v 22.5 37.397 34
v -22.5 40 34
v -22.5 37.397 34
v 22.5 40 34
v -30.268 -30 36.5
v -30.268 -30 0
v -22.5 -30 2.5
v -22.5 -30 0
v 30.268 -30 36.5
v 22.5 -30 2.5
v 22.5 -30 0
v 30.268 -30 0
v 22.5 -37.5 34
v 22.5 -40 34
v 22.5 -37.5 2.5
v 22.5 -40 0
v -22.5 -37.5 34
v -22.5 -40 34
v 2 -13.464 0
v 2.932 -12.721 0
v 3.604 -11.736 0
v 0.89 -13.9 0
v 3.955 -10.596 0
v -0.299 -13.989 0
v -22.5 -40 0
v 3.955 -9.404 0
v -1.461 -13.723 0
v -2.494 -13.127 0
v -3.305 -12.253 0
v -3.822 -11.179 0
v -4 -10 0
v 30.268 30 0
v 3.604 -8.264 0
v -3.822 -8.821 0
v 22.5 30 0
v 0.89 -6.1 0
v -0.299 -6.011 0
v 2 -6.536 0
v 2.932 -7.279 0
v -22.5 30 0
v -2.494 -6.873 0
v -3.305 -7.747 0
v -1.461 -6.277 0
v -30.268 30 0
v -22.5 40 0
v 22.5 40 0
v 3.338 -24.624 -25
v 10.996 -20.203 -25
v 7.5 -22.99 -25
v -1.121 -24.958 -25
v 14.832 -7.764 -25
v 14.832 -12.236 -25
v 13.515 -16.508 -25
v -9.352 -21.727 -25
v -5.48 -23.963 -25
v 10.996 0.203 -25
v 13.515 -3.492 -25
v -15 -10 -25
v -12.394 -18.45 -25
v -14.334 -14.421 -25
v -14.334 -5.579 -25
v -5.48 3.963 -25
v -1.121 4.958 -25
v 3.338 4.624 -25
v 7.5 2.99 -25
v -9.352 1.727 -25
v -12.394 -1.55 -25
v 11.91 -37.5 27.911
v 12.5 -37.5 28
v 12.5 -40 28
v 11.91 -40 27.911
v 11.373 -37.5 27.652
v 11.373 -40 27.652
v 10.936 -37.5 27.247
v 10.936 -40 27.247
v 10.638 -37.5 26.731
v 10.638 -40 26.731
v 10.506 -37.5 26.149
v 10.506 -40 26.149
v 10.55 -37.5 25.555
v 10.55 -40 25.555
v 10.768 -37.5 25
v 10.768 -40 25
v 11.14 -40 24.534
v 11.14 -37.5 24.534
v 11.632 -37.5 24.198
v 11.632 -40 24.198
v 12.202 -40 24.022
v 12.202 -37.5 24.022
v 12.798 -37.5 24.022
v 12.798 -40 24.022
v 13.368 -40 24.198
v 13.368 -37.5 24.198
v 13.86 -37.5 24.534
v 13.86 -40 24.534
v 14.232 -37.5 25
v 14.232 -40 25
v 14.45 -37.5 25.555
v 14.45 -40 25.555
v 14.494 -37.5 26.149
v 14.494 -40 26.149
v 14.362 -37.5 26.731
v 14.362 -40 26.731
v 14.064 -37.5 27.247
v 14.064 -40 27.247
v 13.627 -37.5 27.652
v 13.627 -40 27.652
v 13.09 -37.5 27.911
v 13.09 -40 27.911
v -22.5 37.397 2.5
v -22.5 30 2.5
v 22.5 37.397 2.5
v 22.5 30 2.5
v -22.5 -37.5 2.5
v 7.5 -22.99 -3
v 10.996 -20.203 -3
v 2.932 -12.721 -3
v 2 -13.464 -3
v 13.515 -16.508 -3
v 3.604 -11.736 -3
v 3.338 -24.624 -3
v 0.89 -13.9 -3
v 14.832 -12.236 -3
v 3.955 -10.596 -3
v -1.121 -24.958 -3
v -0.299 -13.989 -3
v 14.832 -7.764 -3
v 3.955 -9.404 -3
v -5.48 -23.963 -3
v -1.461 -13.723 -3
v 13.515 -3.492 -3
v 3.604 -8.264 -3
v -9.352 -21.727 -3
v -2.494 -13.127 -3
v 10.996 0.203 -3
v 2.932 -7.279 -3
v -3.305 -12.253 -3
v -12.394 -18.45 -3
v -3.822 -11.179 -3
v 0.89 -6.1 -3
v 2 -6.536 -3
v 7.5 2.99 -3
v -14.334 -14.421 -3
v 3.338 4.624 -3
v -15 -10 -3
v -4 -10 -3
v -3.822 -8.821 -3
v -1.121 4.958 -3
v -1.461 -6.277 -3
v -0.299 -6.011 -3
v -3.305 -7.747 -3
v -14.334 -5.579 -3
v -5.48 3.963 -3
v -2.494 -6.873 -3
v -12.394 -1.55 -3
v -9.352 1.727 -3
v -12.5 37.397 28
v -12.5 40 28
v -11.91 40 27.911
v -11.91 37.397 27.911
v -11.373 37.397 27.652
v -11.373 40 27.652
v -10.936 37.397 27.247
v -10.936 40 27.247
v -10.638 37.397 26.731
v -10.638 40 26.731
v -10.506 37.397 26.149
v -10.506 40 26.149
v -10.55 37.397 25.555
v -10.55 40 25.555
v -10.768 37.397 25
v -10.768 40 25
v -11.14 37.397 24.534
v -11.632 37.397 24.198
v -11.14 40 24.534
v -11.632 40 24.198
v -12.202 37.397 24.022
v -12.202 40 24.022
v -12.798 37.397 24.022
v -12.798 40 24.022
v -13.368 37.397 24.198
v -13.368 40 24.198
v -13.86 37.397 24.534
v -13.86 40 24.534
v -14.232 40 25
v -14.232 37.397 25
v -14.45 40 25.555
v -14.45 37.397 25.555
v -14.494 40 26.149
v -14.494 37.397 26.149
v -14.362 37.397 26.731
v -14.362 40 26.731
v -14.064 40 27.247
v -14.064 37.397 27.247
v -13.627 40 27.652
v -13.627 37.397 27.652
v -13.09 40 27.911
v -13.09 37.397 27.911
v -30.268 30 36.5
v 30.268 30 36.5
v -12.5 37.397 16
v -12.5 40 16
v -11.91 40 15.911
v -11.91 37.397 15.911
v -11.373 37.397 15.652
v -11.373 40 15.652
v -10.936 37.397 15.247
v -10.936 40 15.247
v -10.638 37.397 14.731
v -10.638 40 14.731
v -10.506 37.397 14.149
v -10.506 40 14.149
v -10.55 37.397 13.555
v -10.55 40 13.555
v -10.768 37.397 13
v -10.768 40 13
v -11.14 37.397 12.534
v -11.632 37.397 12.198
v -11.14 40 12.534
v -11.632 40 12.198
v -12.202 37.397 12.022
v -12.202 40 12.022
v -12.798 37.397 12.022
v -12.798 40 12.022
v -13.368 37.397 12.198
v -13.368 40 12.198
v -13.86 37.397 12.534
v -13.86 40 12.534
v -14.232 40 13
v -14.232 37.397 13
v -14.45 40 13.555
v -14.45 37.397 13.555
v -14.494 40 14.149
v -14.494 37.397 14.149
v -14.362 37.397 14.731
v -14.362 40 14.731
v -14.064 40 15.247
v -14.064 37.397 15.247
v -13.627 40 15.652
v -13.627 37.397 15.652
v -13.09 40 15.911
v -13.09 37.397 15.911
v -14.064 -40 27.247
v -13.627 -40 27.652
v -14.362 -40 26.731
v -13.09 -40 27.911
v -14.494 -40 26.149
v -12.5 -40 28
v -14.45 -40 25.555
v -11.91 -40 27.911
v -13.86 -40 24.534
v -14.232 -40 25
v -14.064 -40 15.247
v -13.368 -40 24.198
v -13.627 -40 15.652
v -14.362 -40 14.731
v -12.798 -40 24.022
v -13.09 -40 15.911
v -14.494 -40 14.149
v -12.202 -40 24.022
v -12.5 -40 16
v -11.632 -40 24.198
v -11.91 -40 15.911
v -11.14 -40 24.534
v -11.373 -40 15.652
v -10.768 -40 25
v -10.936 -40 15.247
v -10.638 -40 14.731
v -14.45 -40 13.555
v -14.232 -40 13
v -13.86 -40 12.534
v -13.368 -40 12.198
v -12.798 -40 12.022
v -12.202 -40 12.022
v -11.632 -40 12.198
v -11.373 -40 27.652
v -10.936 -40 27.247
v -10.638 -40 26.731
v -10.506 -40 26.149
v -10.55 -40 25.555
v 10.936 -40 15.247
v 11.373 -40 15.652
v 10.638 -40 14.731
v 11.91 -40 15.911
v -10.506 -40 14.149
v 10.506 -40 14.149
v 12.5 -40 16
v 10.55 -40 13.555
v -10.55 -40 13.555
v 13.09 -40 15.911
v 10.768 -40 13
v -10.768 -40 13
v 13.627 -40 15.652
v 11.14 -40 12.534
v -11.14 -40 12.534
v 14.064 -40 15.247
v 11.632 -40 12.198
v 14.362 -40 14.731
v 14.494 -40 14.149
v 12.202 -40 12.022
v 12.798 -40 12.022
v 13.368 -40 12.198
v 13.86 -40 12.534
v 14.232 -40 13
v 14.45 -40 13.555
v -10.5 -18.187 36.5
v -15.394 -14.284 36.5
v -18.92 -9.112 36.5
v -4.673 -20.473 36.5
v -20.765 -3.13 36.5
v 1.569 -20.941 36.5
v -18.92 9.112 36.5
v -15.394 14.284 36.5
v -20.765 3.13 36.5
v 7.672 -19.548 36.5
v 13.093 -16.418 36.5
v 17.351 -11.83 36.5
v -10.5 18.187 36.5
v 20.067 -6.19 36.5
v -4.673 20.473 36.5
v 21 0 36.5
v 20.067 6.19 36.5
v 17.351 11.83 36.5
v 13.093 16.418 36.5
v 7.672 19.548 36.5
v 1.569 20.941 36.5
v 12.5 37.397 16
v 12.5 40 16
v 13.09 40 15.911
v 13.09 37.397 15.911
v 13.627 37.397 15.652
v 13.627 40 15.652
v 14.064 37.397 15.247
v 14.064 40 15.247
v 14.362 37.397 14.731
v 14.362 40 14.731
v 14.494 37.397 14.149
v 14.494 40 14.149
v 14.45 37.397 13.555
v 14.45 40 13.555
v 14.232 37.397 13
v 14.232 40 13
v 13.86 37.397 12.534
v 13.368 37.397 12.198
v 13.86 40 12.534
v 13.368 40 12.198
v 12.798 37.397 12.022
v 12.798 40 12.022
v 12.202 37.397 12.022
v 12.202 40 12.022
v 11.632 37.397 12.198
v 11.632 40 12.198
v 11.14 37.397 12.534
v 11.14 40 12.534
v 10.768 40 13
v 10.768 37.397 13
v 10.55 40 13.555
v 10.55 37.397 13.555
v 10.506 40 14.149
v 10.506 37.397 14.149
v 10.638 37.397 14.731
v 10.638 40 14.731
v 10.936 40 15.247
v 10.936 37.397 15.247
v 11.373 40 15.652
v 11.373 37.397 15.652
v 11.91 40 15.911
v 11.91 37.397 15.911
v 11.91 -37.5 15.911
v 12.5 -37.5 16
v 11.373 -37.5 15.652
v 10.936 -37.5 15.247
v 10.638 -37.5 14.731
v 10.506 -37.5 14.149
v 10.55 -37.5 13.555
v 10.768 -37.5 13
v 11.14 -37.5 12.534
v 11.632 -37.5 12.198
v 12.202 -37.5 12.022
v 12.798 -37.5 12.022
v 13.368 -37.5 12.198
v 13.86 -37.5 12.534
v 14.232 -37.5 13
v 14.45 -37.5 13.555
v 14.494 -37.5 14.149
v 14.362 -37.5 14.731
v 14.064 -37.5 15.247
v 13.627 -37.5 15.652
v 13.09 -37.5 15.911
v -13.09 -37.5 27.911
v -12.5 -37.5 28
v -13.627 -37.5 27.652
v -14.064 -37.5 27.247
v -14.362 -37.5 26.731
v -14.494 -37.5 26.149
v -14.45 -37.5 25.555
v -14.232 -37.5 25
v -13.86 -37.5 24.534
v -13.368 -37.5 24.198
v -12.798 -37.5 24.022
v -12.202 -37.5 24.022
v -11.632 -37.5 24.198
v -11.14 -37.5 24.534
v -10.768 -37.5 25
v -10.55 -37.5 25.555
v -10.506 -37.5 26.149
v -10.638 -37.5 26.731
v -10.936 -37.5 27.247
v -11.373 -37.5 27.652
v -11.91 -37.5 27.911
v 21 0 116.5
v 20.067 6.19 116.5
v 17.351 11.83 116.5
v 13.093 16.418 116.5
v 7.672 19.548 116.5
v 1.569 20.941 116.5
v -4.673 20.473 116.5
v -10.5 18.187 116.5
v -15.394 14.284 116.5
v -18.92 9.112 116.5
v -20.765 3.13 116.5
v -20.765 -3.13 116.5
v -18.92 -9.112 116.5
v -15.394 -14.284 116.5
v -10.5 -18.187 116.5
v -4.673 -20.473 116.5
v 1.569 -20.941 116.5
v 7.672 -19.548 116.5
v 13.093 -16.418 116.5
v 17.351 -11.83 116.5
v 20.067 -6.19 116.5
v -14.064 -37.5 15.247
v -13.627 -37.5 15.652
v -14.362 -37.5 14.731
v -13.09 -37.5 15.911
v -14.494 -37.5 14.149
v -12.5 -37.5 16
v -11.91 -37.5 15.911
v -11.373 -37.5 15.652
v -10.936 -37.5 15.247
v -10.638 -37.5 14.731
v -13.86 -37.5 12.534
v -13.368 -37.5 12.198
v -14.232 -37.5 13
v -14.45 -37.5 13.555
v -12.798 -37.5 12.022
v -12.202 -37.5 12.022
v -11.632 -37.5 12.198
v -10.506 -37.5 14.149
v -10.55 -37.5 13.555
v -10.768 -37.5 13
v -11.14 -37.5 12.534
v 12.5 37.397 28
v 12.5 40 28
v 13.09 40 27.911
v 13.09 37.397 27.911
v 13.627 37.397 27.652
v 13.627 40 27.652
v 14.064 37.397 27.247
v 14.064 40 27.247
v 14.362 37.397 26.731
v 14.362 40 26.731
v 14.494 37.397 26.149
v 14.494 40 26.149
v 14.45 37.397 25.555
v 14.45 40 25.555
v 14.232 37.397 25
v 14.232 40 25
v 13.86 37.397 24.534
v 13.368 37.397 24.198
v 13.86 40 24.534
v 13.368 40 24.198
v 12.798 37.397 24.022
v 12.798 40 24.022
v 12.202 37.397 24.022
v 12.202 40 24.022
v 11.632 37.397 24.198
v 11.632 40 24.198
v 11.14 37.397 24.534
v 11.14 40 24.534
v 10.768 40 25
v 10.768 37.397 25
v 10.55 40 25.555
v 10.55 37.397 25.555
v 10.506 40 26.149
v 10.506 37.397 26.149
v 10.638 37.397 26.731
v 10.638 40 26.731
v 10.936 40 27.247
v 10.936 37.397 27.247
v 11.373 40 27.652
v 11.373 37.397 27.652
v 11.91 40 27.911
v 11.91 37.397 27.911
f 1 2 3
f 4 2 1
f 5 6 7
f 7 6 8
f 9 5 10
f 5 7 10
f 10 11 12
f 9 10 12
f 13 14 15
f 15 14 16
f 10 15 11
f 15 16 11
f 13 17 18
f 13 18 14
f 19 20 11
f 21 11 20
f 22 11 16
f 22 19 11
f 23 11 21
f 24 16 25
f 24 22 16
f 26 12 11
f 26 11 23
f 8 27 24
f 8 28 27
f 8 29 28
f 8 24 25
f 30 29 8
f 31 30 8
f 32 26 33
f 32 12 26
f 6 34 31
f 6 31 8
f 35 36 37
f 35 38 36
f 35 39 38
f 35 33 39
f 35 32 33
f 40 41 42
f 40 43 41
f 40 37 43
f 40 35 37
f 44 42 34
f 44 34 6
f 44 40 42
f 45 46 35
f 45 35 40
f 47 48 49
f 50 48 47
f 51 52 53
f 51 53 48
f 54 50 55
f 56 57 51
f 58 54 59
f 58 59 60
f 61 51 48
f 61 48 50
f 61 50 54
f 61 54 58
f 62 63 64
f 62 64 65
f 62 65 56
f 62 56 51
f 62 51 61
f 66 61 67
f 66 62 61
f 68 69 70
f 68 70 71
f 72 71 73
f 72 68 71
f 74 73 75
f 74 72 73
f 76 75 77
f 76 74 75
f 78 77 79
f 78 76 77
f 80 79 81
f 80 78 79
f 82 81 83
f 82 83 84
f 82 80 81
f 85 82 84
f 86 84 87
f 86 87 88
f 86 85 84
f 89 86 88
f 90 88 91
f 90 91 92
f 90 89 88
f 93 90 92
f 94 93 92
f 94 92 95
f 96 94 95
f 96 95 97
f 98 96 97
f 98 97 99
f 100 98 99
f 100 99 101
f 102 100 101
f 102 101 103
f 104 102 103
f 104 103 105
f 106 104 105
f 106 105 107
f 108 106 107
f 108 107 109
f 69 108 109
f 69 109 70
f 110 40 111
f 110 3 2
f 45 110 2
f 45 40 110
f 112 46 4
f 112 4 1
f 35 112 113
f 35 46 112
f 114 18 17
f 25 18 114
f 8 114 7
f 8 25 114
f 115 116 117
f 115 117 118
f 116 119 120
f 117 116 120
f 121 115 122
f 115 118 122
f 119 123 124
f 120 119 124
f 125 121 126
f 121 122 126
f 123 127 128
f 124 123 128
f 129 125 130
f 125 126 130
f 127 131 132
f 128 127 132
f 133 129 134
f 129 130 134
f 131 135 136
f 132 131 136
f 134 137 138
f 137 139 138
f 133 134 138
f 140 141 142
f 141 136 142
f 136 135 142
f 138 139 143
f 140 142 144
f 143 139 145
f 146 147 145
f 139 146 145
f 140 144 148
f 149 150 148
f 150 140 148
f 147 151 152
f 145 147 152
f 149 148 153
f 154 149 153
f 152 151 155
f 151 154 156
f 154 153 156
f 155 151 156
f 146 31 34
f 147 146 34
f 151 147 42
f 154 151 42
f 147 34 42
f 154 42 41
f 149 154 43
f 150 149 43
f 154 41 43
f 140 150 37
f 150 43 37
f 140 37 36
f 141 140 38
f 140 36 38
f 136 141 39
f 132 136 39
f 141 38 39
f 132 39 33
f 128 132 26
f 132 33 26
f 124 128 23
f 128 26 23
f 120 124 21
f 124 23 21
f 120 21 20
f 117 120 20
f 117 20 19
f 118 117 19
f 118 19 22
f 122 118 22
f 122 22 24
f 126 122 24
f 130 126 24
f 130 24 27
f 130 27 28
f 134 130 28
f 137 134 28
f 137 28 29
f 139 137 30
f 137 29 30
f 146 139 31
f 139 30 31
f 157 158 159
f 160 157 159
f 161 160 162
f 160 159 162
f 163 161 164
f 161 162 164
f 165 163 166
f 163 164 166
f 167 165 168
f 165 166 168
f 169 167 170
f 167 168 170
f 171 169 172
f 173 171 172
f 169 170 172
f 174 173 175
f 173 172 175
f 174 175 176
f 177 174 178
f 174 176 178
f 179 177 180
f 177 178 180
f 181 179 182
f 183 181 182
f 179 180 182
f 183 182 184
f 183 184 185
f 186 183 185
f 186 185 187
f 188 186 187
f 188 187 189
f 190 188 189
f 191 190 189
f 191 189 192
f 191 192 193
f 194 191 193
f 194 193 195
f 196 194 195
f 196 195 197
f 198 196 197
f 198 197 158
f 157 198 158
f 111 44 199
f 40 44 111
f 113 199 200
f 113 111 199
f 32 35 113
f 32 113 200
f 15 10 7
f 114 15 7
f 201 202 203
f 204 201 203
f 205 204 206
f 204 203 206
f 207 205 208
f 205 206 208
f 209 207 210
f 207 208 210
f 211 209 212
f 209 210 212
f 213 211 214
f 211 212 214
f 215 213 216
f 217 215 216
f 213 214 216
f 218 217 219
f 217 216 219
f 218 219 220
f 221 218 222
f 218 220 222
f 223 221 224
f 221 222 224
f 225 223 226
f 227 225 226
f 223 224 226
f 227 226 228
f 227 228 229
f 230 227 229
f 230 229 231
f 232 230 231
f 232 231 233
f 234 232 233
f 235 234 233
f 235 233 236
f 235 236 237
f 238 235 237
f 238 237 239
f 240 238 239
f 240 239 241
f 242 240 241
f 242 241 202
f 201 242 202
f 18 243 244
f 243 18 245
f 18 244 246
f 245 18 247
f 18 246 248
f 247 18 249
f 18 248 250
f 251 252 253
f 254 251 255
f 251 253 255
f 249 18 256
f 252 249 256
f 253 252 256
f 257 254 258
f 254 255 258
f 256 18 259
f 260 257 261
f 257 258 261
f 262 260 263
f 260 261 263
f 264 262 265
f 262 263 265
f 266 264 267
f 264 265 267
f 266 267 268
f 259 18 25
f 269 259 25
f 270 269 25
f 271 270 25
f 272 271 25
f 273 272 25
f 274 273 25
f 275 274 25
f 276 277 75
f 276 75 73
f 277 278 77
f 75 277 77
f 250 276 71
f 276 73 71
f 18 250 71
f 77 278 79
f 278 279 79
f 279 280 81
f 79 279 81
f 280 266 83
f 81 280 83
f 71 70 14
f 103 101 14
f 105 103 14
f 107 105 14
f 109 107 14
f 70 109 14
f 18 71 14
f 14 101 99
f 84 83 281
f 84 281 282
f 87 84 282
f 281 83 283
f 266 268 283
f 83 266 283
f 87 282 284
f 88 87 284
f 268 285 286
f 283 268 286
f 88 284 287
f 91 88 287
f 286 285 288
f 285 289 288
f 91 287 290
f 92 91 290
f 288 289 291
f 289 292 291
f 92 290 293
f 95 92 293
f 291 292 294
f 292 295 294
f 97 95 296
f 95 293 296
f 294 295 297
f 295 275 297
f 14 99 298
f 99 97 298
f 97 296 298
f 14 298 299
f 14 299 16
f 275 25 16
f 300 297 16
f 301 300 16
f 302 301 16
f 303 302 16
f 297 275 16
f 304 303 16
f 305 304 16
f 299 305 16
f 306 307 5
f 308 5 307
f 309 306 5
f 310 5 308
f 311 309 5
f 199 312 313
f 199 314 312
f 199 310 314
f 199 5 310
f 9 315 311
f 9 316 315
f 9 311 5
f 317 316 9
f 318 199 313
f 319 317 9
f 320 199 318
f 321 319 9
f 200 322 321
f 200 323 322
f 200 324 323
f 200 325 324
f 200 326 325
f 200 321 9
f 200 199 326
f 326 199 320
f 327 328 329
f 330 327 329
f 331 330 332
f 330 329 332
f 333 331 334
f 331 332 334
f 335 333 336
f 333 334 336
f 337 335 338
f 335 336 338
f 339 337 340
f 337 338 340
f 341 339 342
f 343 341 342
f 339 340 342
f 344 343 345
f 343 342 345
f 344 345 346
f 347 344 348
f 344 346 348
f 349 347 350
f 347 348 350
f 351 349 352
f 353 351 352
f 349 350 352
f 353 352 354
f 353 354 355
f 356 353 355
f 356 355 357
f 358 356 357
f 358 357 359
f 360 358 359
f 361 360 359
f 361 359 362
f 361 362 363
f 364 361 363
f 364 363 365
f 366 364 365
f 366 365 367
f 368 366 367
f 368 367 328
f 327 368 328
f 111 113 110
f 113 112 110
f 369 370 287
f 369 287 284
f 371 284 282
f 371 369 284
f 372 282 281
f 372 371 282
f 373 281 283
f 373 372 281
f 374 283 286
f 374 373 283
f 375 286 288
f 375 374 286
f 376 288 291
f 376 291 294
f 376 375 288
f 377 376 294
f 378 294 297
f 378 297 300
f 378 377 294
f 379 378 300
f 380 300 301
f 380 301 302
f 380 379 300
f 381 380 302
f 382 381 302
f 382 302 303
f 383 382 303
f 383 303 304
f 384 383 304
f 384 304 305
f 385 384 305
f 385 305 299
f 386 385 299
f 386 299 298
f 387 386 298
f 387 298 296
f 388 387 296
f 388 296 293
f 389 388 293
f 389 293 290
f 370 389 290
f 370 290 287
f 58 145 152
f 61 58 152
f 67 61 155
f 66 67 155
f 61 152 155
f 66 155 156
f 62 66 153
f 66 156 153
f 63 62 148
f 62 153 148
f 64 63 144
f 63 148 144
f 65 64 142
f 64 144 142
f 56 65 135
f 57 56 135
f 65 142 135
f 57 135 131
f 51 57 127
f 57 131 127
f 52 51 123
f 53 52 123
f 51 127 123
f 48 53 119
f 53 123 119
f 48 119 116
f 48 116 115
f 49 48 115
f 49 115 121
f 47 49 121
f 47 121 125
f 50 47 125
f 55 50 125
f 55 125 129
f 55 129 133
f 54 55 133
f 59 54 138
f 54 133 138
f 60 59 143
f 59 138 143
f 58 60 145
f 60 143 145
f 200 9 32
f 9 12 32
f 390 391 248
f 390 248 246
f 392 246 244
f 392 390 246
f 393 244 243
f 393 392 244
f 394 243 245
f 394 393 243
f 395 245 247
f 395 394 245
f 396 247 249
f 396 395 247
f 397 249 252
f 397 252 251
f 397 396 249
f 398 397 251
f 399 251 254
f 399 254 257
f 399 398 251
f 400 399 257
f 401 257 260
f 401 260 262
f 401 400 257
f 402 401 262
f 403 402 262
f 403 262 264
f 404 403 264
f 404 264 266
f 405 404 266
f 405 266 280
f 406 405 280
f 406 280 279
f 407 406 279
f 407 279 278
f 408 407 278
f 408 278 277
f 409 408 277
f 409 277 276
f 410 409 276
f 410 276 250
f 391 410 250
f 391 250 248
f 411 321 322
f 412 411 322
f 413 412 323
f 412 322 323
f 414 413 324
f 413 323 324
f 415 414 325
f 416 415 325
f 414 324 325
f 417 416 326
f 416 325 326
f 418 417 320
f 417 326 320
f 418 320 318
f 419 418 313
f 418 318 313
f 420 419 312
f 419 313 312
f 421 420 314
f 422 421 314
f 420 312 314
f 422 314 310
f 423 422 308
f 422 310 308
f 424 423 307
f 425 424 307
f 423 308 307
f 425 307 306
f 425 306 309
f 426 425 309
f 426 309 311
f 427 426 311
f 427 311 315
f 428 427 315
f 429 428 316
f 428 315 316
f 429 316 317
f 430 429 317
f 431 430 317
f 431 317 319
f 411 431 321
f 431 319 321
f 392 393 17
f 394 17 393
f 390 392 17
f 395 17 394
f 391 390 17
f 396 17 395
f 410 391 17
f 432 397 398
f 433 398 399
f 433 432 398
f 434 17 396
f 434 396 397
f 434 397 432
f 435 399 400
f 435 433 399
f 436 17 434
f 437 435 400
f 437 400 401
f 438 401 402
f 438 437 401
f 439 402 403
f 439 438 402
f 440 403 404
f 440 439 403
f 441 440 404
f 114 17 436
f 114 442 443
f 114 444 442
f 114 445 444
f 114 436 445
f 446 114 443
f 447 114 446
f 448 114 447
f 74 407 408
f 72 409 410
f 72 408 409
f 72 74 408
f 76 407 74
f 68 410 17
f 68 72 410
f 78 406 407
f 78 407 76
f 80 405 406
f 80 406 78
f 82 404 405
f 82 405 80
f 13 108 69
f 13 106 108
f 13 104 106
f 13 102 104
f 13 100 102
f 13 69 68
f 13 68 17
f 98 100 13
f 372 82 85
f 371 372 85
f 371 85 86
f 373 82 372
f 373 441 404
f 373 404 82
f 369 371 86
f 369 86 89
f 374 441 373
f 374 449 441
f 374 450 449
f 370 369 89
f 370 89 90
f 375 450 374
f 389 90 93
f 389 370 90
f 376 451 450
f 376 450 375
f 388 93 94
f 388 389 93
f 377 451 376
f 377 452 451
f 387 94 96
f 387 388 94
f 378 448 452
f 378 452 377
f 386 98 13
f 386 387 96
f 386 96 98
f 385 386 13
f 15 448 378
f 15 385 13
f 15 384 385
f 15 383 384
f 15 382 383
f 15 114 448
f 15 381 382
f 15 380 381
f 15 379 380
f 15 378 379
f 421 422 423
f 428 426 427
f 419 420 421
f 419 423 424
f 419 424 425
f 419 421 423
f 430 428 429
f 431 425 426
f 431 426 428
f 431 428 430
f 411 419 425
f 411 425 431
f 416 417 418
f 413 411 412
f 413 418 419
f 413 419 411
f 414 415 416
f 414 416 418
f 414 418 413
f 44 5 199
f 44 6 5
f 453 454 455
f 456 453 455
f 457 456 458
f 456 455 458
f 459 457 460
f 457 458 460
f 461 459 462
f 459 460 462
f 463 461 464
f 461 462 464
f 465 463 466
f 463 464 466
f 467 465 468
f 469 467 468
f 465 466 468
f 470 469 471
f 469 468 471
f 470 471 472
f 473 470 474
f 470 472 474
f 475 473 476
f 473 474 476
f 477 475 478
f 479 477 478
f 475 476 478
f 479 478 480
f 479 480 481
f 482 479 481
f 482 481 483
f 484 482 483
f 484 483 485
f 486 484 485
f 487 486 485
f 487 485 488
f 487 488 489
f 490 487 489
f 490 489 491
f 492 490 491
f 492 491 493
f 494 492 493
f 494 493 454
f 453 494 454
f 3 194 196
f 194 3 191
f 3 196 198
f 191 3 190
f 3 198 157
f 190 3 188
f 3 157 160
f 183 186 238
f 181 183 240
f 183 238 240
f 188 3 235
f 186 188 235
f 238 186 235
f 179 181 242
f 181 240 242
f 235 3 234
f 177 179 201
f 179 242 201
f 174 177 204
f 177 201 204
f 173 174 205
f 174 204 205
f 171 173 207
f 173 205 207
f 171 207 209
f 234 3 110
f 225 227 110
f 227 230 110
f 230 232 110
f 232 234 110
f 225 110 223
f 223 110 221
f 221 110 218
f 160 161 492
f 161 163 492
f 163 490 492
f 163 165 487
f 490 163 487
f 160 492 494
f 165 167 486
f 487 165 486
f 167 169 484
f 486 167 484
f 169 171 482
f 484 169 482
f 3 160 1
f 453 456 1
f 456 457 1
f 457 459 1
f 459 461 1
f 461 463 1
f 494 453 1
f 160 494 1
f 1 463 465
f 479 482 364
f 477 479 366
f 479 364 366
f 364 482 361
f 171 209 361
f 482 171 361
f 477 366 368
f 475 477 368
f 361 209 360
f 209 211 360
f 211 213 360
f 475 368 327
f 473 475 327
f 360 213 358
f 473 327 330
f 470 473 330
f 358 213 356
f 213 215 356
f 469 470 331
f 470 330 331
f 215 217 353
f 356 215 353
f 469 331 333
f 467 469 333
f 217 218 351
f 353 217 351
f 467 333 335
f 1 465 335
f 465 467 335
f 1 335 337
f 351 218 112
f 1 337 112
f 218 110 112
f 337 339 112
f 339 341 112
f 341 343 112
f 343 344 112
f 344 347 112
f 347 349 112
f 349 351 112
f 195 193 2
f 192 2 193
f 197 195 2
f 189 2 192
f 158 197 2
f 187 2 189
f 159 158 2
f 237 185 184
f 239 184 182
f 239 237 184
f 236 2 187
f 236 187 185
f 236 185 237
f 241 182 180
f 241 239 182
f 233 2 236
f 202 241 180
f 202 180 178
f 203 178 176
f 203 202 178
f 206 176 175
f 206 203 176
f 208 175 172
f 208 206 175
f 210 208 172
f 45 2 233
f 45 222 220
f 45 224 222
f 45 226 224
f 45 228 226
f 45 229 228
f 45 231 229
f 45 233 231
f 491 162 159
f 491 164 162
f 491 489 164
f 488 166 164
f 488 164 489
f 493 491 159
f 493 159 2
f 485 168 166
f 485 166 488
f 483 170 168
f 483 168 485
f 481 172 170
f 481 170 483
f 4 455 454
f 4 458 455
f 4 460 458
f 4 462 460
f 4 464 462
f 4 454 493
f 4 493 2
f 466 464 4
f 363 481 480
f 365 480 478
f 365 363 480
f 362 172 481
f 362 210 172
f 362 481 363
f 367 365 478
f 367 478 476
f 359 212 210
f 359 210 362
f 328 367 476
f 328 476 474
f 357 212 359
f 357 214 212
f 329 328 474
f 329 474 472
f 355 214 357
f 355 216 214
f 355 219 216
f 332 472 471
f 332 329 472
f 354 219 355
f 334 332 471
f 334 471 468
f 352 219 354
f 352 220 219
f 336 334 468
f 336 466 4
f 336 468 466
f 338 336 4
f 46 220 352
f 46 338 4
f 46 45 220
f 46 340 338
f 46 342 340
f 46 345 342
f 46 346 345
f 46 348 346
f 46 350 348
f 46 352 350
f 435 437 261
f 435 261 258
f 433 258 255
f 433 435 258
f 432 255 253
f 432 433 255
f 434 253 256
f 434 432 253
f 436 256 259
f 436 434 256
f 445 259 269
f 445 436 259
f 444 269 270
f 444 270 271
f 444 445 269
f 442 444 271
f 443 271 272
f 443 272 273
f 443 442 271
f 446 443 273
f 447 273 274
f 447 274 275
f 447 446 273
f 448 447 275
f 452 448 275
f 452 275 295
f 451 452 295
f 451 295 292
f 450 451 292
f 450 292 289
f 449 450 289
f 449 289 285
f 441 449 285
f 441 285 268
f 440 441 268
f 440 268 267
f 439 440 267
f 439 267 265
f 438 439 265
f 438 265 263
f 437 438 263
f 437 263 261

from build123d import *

# Parameters (mm, degrees)
BOSS_EXTRUDE1_DEPTH = 2.5
SKETCH3_W           = 45
SKETCH3_H           = 2.5
SKETCH3_H_2         = 2.602594336
BOSS_EXTRUDE2_DEPTH = 31.5
SKETCH4_W           = 60.536099416
SKETCH4_H           = 60
BOSS_EXTRUDE3_DEPTH = 34
SKETCH5_R           = 21
BOSS_EXTRUDE4_DEPTH = 80
SKETCH6_R           = 4
BOSS_EXTRUDE5_DEPTH = 3
SKETCH7_R           = 15
BOSS_EXTRUDE6_DEPTH = 22
SKETCH13_R          = 2
CUT_EXTRUDE1_DEPTH  = 3
CUT_EXTRUDE2_START  = -3
SKETCH14_R          = 2
CUT_EXTRUDE2_DEPTH  = 3


with BuildPart() as part:
    # Sketch2 → Boss-Extrude1 (new body)
    with BuildSketch(Plane.XY):
        Polygon((-30.268049708, -30), (-30.268049708, 30), (-22.5, 30), (-22.5, 40), (22.5, 40), (22.5, 30), (30.268049708, 30), (30.268049708, -30), (22.5, -30), (22.5, -40), (-22.5, -40), (-22.5, -30), align=None)
    extrude(amount=BOSS_EXTRUDE1_DEPTH)

    # Sketch3 → Boss-Extrude2 (add)
    with BuildSketch(Plane.XY.offset(2.5)):
        with Locations((0, -38.75)):
            Rectangle(SKETCH3_W, SKETCH3_H)
        with Locations((0, 38.698702832)):
            Rectangle(SKETCH3_W, SKETCH3_H_2)
    extrude(amount=BOSS_EXTRUDE2_DEPTH)

    # Sketch4 → Boss-Extrude3 (add)
    with BuildSketch(Plane.XY.offset(2.5)):
        Rectangle(SKETCH4_W, SKETCH4_H)
    extrude(amount=BOSS_EXTRUDE3_DEPTH)

    # Sketch5 → Boss-Extrude4 (add)
    with BuildSketch(Plane.XY.offset(36.5)):
        Circle(SKETCH5_R)
    extrude(amount=BOSS_EXTRUDE4_DEPTH)

    # Sketch6 → Boss-Extrude5 (add)
    with BuildSketch(Plane(origin=(0, 0, 0), x_dir=(-1, 0, 0), z_dir=(0, 0, -1))):
        with Locations((0, -10)):
            Circle(SKETCH6_R)
    extrude(amount=BOSS_EXTRUDE5_DEPTH)

    # Sketch7 → Boss-Extrude6 (add)
    with BuildSketch(Plane(origin=(0, 0, -3), x_dir=(-1, 0, 0), z_dir=(0, 0, -1))):
        with Locations((0, -10)):
            Circle(SKETCH7_R)
    extrude(amount=BOSS_EXTRUDE6_DEPTH)

    # Sketch13 → Cut-Extrude1 (cut)
    with BuildSketch(Plane(origin=(0, 40, 0), x_dir=(1, 0, 0), z_dir=(0, 1, 0))):
        with Locations(Location((-12.5, -14, 0), (0, 0, 270))):
            Circle(SKETCH13_R)
        with Locations(Location((12.5, -14, 0), (0, 0, 270))):
            Circle(SKETCH13_R)
        with Locations(Location((-12.5, -26, 0), (0, 0, 270))):
            Circle(SKETCH13_R)
        with Locations(Location((12.5, -26, 0), (0, 0, 270))):
            Circle(SKETCH13_R)
    extrude(amount=-CUT_EXTRUDE1_DEPTH, mode=Mode.SUBTRACT)

    # Sketch14 → Cut-Extrude2 (cut)
    with BuildSketch(Plane.XZ.offset(40).offset(CUT_EXTRUDE2_START)):
        with Locations(Location((12.5, 26, 0), (0, 0, 90))):
            Circle(SKETCH14_R)
        with Locations(Location((12.5, 14, 0), (0, 0, 90))):
            Circle(SKETCH14_R)
        with Locations(Location((-12.5, 14, 0), (0, 0, 90))):
            Circle(SKETCH14_R)
        with Locations(Location((-12.5, 26, 0), (0, 0, 90))):
            Circle(SKETCH14_R)
    extrude(amount=CUT_EXTRUDE2_DEPTH, mode=Mode.SUBTRACT)


solid = part.part
